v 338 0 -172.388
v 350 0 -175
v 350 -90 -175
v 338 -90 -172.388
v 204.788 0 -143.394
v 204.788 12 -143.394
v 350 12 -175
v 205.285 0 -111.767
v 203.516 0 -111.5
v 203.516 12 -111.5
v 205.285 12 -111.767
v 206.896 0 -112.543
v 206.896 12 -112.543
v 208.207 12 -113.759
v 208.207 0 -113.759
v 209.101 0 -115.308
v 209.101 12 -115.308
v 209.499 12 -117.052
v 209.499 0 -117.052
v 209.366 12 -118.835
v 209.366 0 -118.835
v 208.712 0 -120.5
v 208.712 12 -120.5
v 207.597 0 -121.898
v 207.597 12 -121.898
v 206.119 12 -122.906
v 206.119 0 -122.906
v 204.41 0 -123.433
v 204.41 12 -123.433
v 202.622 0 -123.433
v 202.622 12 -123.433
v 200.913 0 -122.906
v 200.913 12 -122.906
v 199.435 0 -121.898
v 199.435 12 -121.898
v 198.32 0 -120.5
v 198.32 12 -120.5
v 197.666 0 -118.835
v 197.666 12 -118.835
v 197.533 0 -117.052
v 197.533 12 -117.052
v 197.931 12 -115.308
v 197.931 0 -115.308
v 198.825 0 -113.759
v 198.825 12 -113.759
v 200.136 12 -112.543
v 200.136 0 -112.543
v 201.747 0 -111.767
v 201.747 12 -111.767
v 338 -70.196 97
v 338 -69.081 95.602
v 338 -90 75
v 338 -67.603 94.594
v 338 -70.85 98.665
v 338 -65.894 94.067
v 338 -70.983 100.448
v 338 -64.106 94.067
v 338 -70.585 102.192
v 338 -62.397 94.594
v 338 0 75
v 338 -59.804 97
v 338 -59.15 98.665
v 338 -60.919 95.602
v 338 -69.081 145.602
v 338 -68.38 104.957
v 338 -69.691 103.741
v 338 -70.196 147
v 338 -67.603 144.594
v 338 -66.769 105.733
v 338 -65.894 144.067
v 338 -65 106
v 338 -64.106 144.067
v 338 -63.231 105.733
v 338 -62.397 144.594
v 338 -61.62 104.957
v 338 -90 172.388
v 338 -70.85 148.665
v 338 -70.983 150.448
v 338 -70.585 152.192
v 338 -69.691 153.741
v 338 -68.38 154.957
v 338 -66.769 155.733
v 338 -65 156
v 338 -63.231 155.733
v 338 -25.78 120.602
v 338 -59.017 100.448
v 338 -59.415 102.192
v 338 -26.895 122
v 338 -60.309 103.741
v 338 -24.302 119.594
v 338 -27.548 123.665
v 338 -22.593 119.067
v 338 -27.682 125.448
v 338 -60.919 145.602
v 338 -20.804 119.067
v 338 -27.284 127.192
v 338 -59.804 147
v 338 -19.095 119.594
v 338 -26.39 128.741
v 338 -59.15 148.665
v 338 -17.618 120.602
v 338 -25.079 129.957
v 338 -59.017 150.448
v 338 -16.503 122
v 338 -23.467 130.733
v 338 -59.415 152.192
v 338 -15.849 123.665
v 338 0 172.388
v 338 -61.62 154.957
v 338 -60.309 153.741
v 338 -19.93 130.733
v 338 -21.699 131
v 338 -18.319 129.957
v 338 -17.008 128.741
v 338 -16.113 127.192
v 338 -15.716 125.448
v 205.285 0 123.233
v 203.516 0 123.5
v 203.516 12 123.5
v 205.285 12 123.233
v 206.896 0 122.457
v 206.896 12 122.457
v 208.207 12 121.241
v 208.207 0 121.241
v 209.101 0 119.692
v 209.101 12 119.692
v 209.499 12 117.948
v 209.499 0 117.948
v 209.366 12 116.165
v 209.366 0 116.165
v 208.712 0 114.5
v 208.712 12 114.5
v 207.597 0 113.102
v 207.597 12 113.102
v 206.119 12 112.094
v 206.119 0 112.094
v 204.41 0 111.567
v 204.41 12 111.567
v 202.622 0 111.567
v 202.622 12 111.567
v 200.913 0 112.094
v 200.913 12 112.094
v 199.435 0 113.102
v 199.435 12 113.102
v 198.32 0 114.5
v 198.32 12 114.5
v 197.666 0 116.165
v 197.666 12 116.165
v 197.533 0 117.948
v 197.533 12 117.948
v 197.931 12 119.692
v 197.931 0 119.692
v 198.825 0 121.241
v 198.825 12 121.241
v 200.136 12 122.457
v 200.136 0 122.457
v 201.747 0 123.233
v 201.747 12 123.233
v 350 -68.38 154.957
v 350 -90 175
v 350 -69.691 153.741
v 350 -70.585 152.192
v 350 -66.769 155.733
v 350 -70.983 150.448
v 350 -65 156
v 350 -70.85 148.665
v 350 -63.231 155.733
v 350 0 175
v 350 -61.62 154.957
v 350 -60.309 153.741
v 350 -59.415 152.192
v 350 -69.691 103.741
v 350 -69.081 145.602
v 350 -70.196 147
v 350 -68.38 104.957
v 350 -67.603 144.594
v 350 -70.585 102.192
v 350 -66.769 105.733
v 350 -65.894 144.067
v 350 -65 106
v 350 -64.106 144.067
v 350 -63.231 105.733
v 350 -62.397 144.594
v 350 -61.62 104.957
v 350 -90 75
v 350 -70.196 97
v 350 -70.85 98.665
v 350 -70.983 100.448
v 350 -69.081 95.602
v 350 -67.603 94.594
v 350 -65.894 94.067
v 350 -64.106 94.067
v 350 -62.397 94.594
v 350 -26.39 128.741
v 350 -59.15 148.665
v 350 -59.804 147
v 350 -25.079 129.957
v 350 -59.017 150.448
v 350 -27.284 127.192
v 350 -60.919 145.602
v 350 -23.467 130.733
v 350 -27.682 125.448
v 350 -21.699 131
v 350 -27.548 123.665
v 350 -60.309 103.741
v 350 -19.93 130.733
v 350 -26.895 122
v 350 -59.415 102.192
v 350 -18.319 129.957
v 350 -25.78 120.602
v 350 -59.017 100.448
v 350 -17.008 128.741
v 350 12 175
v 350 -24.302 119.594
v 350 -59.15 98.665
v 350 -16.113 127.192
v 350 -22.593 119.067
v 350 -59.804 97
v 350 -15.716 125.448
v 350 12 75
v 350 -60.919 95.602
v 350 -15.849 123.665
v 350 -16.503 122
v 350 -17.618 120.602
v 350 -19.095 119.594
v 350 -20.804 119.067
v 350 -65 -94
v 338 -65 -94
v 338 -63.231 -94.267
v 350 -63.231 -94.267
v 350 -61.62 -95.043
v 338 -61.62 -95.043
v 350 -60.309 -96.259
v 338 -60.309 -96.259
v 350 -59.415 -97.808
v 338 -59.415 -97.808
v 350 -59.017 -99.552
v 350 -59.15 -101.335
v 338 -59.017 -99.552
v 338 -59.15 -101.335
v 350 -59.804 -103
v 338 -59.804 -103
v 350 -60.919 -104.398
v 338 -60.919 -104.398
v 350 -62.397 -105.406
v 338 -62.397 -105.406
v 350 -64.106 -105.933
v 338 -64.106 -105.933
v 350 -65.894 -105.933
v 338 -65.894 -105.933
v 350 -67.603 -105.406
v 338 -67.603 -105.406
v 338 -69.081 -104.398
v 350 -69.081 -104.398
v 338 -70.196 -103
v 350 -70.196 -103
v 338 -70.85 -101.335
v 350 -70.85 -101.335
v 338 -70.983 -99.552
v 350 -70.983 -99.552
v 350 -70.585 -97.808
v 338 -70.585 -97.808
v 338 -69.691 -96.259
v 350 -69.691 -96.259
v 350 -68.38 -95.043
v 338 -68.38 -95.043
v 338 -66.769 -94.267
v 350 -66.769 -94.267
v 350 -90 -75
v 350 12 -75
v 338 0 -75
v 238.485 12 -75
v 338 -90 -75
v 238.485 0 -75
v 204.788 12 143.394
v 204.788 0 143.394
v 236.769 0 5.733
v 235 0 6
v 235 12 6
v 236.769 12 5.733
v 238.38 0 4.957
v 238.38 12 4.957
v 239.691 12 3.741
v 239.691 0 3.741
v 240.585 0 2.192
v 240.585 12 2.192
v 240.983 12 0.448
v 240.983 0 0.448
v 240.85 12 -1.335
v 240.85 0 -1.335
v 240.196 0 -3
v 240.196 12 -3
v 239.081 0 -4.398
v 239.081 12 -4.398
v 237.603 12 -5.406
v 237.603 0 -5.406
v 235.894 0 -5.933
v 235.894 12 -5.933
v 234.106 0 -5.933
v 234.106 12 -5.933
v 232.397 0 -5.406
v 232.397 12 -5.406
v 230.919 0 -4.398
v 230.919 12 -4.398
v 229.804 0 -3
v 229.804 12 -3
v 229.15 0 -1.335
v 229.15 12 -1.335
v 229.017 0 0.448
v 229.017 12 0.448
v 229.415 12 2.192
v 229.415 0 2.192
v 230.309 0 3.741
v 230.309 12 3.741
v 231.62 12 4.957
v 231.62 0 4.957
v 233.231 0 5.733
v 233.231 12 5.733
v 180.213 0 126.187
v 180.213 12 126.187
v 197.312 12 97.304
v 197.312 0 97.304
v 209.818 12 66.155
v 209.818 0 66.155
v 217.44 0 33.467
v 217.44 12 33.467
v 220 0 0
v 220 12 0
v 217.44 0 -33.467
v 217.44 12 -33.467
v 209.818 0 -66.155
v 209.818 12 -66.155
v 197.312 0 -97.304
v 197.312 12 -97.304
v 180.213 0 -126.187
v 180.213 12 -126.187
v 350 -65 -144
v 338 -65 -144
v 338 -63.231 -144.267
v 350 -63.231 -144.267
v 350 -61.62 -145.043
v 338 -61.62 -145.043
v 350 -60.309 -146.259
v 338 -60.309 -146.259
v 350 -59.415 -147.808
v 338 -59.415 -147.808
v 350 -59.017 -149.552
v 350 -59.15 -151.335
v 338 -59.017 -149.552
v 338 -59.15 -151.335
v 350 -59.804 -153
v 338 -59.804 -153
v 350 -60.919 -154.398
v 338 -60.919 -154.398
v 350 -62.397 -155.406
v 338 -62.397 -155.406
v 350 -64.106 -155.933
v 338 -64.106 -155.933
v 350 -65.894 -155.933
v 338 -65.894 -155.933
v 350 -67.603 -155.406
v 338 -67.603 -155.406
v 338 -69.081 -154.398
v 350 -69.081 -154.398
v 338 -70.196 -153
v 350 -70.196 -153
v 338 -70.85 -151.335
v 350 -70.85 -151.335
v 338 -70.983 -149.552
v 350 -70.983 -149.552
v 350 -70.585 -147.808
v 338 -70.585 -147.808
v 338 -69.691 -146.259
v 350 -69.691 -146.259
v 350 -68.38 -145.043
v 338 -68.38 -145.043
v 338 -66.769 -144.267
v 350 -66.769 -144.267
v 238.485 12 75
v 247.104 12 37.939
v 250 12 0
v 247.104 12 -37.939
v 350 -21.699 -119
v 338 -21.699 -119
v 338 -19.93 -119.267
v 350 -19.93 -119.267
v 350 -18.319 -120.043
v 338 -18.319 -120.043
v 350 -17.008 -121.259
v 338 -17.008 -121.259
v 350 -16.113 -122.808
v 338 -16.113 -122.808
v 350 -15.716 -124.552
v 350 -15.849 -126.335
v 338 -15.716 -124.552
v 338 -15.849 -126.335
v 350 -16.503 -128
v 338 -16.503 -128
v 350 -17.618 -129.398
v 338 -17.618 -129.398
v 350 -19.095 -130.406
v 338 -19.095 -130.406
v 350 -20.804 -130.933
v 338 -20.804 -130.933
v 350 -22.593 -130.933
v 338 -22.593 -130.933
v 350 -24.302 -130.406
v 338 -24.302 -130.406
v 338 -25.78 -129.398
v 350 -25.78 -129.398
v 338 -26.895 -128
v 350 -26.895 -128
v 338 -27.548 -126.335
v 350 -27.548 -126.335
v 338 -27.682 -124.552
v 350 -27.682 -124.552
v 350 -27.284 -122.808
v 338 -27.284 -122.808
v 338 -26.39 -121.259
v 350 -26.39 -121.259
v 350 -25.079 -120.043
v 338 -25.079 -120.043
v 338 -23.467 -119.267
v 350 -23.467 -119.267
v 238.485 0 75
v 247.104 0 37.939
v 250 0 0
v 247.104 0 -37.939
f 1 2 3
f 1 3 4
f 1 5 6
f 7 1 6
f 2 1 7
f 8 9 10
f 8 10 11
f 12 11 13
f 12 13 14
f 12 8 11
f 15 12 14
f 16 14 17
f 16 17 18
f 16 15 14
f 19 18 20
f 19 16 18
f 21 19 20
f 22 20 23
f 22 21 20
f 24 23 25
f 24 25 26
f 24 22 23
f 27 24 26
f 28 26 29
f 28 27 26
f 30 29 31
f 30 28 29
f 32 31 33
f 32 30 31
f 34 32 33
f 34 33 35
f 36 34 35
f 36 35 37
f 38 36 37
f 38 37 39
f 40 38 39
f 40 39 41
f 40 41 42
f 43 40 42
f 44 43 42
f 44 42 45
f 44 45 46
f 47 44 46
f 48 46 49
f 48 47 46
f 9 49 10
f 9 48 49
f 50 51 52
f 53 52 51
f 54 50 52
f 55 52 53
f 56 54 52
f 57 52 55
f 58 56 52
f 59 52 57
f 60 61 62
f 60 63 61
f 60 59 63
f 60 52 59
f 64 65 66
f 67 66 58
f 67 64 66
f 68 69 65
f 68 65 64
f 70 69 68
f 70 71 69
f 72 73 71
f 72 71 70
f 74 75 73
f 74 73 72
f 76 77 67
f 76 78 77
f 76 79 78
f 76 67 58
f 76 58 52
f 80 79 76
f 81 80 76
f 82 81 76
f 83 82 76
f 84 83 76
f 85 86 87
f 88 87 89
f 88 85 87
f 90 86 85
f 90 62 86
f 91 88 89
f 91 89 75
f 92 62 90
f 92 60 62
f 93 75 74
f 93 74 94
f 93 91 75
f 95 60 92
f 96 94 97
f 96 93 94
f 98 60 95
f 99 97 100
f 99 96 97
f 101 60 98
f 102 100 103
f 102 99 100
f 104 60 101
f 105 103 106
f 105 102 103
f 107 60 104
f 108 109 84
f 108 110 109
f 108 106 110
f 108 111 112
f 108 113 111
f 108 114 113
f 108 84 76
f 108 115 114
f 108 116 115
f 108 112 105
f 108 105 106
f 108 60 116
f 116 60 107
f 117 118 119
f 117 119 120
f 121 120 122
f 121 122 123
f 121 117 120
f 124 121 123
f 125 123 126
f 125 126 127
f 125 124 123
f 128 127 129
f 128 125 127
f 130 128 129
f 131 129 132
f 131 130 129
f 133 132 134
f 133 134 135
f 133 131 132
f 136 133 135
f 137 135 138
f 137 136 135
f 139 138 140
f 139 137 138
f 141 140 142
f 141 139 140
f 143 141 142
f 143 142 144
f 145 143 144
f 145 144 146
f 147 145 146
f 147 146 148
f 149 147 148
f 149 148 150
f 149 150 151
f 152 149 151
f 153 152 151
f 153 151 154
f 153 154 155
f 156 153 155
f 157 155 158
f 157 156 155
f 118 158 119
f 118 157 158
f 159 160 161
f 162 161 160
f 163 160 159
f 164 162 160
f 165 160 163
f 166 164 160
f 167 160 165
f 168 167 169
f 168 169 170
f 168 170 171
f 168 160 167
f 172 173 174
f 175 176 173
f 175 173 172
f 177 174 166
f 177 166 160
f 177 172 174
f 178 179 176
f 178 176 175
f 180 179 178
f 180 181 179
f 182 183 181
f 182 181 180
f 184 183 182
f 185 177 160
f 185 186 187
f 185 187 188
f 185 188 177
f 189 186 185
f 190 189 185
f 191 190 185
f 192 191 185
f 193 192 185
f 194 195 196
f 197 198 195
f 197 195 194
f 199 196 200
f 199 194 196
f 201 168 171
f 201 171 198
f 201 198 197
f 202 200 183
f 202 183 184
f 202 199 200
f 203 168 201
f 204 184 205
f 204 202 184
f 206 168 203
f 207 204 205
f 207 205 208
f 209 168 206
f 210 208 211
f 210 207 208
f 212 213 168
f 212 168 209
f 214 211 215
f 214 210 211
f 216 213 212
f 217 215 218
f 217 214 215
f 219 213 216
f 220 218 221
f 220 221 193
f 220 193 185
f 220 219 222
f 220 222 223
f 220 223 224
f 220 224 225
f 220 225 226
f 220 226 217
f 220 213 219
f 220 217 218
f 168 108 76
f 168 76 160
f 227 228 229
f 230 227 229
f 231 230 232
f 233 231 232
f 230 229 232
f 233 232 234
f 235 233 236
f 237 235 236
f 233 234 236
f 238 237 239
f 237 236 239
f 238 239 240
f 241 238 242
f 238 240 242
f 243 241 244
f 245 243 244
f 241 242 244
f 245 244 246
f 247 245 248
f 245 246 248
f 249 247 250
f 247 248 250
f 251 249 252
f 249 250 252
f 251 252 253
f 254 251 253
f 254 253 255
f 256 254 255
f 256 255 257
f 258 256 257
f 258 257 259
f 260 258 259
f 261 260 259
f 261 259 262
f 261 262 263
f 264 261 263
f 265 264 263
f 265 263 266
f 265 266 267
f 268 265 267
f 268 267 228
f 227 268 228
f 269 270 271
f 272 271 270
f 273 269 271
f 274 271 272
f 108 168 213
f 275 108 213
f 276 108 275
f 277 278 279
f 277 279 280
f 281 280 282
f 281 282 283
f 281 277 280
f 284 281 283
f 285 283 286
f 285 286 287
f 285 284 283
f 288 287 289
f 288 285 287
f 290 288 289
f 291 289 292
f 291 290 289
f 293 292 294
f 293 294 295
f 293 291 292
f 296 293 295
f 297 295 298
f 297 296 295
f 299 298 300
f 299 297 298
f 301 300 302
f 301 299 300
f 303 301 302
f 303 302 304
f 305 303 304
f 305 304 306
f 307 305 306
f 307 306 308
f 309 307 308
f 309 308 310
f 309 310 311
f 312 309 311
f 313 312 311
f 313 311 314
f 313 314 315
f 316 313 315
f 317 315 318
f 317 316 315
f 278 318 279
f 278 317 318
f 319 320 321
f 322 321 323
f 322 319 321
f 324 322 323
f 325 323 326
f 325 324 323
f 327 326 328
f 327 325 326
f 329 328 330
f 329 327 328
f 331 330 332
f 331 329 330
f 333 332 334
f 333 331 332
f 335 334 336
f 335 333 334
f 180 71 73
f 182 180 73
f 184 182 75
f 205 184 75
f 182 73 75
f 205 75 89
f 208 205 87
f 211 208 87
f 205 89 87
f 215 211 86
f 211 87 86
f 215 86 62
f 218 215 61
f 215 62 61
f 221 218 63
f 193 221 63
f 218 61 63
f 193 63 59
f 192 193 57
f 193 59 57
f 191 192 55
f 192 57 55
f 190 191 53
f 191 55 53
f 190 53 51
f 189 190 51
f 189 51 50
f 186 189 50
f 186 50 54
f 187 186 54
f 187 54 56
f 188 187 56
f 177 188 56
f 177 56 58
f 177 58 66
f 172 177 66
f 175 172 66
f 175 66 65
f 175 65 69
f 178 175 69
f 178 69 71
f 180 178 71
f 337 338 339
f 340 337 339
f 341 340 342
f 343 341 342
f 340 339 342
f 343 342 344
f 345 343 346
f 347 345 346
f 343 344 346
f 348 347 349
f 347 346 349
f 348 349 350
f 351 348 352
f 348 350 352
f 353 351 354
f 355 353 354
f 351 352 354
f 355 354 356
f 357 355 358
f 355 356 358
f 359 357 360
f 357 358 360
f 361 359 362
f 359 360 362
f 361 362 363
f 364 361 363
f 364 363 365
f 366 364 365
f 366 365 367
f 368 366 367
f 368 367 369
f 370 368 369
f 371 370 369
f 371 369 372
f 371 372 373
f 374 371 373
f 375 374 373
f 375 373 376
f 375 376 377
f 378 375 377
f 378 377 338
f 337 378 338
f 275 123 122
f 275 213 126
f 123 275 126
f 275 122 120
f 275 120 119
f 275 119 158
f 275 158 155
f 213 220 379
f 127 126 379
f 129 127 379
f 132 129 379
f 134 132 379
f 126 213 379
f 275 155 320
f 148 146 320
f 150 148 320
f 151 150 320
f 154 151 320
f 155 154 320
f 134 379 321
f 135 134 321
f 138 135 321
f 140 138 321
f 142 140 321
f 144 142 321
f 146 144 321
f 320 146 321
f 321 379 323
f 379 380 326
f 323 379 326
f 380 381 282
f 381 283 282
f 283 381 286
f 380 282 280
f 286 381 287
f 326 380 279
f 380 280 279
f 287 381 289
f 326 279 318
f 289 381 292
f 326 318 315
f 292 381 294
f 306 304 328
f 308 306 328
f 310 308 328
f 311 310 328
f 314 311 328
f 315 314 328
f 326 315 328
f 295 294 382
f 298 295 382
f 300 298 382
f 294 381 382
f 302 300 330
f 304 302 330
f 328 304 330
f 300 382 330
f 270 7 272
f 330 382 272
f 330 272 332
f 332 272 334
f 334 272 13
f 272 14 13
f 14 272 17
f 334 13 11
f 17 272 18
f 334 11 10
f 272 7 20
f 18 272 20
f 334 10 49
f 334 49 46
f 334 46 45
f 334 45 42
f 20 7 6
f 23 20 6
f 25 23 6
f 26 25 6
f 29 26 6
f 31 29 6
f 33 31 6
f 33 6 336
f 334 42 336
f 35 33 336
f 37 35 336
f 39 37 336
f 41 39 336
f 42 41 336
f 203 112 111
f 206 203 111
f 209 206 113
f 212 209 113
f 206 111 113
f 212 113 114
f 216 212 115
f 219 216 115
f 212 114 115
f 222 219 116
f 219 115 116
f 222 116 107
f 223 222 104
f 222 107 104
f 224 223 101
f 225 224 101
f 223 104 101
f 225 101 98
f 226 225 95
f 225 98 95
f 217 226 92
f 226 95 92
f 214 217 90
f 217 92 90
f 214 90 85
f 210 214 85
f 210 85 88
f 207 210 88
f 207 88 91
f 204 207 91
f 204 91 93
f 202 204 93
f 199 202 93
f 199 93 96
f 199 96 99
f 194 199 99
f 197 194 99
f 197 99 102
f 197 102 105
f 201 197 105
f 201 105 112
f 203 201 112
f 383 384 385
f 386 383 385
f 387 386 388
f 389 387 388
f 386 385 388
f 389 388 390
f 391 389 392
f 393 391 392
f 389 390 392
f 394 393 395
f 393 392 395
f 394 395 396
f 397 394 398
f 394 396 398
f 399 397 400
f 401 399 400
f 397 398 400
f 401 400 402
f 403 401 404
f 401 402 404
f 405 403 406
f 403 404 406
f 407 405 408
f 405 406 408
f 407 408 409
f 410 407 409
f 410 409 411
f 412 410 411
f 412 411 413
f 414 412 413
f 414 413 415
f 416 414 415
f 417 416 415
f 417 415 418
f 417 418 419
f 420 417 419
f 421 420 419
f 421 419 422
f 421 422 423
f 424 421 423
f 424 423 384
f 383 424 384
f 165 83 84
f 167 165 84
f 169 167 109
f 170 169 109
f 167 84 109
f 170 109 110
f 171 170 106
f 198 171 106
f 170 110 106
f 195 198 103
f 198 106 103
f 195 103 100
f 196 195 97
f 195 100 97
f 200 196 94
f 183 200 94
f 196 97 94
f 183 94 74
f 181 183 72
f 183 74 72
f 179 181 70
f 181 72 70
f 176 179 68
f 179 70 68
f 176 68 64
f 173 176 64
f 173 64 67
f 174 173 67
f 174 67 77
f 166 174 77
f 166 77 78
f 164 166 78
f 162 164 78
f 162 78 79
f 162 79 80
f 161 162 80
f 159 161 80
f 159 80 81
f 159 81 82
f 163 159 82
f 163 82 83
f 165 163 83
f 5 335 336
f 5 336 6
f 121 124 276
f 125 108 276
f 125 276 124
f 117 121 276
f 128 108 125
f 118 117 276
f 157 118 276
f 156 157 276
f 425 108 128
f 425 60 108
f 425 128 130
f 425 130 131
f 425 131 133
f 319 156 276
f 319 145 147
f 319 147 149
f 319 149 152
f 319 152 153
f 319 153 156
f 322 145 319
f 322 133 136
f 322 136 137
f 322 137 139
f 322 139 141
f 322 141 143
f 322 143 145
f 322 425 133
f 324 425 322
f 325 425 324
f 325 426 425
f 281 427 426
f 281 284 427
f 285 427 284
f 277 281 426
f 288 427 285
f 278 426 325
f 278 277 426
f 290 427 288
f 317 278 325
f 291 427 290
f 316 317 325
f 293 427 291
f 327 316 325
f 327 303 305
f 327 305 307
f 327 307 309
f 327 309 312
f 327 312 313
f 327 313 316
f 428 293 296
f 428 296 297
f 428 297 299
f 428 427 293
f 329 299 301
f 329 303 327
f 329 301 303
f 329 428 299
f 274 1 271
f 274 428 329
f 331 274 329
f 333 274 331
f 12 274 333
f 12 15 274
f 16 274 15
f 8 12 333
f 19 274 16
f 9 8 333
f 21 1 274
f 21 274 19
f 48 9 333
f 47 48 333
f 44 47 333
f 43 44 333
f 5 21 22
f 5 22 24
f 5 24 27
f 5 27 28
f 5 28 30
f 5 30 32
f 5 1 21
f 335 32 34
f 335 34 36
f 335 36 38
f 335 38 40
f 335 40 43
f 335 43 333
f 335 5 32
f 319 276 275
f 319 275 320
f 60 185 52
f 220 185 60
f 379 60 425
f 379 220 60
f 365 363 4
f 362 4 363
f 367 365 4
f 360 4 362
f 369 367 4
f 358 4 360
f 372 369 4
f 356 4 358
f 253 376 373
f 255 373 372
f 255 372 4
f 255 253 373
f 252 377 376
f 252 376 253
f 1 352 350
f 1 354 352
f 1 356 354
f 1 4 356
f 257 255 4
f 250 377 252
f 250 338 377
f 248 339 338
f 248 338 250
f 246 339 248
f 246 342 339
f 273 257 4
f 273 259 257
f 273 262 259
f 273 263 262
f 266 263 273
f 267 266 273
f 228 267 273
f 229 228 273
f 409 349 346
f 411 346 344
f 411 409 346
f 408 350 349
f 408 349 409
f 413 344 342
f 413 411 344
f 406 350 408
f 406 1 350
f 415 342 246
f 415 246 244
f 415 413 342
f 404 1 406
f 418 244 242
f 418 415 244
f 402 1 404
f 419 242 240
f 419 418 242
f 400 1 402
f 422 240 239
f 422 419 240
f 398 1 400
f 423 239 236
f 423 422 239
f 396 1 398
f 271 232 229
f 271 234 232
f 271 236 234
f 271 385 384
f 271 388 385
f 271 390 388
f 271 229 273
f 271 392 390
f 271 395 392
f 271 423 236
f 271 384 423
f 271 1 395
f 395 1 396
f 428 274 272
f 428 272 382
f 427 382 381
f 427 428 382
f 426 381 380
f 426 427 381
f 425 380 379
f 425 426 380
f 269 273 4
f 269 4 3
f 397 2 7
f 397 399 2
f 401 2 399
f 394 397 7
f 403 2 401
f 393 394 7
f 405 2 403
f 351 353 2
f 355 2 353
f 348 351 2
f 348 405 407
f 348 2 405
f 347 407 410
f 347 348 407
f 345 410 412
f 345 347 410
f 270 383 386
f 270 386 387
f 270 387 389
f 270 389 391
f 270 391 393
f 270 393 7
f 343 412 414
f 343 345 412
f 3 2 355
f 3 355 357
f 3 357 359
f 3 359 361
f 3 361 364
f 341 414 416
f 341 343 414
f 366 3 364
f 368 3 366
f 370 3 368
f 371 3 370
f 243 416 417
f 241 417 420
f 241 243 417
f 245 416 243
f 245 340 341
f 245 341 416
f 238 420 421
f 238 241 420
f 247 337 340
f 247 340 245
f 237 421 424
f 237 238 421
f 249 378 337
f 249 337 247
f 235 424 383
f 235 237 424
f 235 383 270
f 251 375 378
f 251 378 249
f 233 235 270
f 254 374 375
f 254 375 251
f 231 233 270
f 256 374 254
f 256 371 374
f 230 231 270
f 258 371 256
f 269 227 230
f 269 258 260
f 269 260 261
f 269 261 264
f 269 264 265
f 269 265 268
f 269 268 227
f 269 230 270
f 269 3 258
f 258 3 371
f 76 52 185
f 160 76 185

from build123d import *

# Parameters (mm, degrees)
SKETCH1_R           = 6
BOSS_EXTRUDE2_DEPTH = 12
BOSS_EXTRUDE3_DEPTH = 90
SKETCH4_R           = 6
CUT_EXTRUDE1_DEPTH  = 253.233216373


with BuildPart() as part:
    # Sketch1 → Boss-Extrude2 (new body)
    with BuildSketch(Plane(origin=(0, 0, 0), x_dir=(1, 0, 0), z_dir=(0, 1, 0))):
        with BuildLine():
            Line((350, 175), (350, 75))
            Line((350, 75), (238.484800354, 75))
            ThreePointArc((238.484800354, 75), (250, 0), (238.484800354, -75))
            Line((238.484800354, -75), (350, -75))
            Line((350, -75), (350, -175))
            Line((350, -175), (204.788011072, -143.394109088))
            Line((204.788011072, -143.394109088), (180.213449744, -126.186815997))
            ThreePointArc((180.213449744, -126.186815997), (220, 0), (180.213449744, 126.186815997))
            Line((180.213449744, 126.186815997), (204.788011072, 143.394109088))
            Line((204.788011072, 143.394109088), (350, 175))
        make_face()
        with Locations(Location((203.515969889, -117.5, 0), (0, 0, 270))):
            Circle(SKETCH1_R, mode=Mode.SUBTRACT)
        with Locations(Location((235, 0, 0), (0, 0, 270))):
            Circle(SKETCH1_R, mode=Mode.SUBTRACT)
        with Locations(Location((203.515969889, 117.5, 0), (0, 0, 270))):
            Circle(SKETCH1_R, mode=Mode.SUBTRACT)
    extrude(amount=BOSS_EXTRUDE2_DEPTH)

    # Sketch2 → Boss-Extrude3 (add)
    with BuildSketch(Plane(origin=(0, 0, 0), x_dir=(-1, 0, 0), z_dir=(0, -1, 0))):
        Polygon((-350, -175), (-350, -75), (-338, -75), (-338, -172.388158555), align=None)
        Polygon((-350, 75), (-350, 175), (-338, 172.388158555), (-338, 75), align=None)
    extrude(amount=BOSS_EXTRUDE3_DEPTH)

    # Sketch4 → Cut-Extrude1 (cut, through all)
    with BuildSketch(Plane.ZY.offset(-338)):
        with Locations((-150, -65)):
            Circle(SKETCH4_R)
        with Locations((-100, -65)):
            Circle(SKETCH4_R)
        with Locations((-125, -21.698729811)):
            Circle(SKETCH4_R)
        with Locations((150, -65)):
            Circle(SKETCH4_R)
        with Locations((125, -21.698729811)):
            Circle(SKETCH4_R)
        with Locations((100, -65)):
            Circle(SKETCH4_R)
    extrude(amount=-CUT_EXTRUDE1_DEPTH, mode=Mode.SUBTRACT)


solid = part.part
